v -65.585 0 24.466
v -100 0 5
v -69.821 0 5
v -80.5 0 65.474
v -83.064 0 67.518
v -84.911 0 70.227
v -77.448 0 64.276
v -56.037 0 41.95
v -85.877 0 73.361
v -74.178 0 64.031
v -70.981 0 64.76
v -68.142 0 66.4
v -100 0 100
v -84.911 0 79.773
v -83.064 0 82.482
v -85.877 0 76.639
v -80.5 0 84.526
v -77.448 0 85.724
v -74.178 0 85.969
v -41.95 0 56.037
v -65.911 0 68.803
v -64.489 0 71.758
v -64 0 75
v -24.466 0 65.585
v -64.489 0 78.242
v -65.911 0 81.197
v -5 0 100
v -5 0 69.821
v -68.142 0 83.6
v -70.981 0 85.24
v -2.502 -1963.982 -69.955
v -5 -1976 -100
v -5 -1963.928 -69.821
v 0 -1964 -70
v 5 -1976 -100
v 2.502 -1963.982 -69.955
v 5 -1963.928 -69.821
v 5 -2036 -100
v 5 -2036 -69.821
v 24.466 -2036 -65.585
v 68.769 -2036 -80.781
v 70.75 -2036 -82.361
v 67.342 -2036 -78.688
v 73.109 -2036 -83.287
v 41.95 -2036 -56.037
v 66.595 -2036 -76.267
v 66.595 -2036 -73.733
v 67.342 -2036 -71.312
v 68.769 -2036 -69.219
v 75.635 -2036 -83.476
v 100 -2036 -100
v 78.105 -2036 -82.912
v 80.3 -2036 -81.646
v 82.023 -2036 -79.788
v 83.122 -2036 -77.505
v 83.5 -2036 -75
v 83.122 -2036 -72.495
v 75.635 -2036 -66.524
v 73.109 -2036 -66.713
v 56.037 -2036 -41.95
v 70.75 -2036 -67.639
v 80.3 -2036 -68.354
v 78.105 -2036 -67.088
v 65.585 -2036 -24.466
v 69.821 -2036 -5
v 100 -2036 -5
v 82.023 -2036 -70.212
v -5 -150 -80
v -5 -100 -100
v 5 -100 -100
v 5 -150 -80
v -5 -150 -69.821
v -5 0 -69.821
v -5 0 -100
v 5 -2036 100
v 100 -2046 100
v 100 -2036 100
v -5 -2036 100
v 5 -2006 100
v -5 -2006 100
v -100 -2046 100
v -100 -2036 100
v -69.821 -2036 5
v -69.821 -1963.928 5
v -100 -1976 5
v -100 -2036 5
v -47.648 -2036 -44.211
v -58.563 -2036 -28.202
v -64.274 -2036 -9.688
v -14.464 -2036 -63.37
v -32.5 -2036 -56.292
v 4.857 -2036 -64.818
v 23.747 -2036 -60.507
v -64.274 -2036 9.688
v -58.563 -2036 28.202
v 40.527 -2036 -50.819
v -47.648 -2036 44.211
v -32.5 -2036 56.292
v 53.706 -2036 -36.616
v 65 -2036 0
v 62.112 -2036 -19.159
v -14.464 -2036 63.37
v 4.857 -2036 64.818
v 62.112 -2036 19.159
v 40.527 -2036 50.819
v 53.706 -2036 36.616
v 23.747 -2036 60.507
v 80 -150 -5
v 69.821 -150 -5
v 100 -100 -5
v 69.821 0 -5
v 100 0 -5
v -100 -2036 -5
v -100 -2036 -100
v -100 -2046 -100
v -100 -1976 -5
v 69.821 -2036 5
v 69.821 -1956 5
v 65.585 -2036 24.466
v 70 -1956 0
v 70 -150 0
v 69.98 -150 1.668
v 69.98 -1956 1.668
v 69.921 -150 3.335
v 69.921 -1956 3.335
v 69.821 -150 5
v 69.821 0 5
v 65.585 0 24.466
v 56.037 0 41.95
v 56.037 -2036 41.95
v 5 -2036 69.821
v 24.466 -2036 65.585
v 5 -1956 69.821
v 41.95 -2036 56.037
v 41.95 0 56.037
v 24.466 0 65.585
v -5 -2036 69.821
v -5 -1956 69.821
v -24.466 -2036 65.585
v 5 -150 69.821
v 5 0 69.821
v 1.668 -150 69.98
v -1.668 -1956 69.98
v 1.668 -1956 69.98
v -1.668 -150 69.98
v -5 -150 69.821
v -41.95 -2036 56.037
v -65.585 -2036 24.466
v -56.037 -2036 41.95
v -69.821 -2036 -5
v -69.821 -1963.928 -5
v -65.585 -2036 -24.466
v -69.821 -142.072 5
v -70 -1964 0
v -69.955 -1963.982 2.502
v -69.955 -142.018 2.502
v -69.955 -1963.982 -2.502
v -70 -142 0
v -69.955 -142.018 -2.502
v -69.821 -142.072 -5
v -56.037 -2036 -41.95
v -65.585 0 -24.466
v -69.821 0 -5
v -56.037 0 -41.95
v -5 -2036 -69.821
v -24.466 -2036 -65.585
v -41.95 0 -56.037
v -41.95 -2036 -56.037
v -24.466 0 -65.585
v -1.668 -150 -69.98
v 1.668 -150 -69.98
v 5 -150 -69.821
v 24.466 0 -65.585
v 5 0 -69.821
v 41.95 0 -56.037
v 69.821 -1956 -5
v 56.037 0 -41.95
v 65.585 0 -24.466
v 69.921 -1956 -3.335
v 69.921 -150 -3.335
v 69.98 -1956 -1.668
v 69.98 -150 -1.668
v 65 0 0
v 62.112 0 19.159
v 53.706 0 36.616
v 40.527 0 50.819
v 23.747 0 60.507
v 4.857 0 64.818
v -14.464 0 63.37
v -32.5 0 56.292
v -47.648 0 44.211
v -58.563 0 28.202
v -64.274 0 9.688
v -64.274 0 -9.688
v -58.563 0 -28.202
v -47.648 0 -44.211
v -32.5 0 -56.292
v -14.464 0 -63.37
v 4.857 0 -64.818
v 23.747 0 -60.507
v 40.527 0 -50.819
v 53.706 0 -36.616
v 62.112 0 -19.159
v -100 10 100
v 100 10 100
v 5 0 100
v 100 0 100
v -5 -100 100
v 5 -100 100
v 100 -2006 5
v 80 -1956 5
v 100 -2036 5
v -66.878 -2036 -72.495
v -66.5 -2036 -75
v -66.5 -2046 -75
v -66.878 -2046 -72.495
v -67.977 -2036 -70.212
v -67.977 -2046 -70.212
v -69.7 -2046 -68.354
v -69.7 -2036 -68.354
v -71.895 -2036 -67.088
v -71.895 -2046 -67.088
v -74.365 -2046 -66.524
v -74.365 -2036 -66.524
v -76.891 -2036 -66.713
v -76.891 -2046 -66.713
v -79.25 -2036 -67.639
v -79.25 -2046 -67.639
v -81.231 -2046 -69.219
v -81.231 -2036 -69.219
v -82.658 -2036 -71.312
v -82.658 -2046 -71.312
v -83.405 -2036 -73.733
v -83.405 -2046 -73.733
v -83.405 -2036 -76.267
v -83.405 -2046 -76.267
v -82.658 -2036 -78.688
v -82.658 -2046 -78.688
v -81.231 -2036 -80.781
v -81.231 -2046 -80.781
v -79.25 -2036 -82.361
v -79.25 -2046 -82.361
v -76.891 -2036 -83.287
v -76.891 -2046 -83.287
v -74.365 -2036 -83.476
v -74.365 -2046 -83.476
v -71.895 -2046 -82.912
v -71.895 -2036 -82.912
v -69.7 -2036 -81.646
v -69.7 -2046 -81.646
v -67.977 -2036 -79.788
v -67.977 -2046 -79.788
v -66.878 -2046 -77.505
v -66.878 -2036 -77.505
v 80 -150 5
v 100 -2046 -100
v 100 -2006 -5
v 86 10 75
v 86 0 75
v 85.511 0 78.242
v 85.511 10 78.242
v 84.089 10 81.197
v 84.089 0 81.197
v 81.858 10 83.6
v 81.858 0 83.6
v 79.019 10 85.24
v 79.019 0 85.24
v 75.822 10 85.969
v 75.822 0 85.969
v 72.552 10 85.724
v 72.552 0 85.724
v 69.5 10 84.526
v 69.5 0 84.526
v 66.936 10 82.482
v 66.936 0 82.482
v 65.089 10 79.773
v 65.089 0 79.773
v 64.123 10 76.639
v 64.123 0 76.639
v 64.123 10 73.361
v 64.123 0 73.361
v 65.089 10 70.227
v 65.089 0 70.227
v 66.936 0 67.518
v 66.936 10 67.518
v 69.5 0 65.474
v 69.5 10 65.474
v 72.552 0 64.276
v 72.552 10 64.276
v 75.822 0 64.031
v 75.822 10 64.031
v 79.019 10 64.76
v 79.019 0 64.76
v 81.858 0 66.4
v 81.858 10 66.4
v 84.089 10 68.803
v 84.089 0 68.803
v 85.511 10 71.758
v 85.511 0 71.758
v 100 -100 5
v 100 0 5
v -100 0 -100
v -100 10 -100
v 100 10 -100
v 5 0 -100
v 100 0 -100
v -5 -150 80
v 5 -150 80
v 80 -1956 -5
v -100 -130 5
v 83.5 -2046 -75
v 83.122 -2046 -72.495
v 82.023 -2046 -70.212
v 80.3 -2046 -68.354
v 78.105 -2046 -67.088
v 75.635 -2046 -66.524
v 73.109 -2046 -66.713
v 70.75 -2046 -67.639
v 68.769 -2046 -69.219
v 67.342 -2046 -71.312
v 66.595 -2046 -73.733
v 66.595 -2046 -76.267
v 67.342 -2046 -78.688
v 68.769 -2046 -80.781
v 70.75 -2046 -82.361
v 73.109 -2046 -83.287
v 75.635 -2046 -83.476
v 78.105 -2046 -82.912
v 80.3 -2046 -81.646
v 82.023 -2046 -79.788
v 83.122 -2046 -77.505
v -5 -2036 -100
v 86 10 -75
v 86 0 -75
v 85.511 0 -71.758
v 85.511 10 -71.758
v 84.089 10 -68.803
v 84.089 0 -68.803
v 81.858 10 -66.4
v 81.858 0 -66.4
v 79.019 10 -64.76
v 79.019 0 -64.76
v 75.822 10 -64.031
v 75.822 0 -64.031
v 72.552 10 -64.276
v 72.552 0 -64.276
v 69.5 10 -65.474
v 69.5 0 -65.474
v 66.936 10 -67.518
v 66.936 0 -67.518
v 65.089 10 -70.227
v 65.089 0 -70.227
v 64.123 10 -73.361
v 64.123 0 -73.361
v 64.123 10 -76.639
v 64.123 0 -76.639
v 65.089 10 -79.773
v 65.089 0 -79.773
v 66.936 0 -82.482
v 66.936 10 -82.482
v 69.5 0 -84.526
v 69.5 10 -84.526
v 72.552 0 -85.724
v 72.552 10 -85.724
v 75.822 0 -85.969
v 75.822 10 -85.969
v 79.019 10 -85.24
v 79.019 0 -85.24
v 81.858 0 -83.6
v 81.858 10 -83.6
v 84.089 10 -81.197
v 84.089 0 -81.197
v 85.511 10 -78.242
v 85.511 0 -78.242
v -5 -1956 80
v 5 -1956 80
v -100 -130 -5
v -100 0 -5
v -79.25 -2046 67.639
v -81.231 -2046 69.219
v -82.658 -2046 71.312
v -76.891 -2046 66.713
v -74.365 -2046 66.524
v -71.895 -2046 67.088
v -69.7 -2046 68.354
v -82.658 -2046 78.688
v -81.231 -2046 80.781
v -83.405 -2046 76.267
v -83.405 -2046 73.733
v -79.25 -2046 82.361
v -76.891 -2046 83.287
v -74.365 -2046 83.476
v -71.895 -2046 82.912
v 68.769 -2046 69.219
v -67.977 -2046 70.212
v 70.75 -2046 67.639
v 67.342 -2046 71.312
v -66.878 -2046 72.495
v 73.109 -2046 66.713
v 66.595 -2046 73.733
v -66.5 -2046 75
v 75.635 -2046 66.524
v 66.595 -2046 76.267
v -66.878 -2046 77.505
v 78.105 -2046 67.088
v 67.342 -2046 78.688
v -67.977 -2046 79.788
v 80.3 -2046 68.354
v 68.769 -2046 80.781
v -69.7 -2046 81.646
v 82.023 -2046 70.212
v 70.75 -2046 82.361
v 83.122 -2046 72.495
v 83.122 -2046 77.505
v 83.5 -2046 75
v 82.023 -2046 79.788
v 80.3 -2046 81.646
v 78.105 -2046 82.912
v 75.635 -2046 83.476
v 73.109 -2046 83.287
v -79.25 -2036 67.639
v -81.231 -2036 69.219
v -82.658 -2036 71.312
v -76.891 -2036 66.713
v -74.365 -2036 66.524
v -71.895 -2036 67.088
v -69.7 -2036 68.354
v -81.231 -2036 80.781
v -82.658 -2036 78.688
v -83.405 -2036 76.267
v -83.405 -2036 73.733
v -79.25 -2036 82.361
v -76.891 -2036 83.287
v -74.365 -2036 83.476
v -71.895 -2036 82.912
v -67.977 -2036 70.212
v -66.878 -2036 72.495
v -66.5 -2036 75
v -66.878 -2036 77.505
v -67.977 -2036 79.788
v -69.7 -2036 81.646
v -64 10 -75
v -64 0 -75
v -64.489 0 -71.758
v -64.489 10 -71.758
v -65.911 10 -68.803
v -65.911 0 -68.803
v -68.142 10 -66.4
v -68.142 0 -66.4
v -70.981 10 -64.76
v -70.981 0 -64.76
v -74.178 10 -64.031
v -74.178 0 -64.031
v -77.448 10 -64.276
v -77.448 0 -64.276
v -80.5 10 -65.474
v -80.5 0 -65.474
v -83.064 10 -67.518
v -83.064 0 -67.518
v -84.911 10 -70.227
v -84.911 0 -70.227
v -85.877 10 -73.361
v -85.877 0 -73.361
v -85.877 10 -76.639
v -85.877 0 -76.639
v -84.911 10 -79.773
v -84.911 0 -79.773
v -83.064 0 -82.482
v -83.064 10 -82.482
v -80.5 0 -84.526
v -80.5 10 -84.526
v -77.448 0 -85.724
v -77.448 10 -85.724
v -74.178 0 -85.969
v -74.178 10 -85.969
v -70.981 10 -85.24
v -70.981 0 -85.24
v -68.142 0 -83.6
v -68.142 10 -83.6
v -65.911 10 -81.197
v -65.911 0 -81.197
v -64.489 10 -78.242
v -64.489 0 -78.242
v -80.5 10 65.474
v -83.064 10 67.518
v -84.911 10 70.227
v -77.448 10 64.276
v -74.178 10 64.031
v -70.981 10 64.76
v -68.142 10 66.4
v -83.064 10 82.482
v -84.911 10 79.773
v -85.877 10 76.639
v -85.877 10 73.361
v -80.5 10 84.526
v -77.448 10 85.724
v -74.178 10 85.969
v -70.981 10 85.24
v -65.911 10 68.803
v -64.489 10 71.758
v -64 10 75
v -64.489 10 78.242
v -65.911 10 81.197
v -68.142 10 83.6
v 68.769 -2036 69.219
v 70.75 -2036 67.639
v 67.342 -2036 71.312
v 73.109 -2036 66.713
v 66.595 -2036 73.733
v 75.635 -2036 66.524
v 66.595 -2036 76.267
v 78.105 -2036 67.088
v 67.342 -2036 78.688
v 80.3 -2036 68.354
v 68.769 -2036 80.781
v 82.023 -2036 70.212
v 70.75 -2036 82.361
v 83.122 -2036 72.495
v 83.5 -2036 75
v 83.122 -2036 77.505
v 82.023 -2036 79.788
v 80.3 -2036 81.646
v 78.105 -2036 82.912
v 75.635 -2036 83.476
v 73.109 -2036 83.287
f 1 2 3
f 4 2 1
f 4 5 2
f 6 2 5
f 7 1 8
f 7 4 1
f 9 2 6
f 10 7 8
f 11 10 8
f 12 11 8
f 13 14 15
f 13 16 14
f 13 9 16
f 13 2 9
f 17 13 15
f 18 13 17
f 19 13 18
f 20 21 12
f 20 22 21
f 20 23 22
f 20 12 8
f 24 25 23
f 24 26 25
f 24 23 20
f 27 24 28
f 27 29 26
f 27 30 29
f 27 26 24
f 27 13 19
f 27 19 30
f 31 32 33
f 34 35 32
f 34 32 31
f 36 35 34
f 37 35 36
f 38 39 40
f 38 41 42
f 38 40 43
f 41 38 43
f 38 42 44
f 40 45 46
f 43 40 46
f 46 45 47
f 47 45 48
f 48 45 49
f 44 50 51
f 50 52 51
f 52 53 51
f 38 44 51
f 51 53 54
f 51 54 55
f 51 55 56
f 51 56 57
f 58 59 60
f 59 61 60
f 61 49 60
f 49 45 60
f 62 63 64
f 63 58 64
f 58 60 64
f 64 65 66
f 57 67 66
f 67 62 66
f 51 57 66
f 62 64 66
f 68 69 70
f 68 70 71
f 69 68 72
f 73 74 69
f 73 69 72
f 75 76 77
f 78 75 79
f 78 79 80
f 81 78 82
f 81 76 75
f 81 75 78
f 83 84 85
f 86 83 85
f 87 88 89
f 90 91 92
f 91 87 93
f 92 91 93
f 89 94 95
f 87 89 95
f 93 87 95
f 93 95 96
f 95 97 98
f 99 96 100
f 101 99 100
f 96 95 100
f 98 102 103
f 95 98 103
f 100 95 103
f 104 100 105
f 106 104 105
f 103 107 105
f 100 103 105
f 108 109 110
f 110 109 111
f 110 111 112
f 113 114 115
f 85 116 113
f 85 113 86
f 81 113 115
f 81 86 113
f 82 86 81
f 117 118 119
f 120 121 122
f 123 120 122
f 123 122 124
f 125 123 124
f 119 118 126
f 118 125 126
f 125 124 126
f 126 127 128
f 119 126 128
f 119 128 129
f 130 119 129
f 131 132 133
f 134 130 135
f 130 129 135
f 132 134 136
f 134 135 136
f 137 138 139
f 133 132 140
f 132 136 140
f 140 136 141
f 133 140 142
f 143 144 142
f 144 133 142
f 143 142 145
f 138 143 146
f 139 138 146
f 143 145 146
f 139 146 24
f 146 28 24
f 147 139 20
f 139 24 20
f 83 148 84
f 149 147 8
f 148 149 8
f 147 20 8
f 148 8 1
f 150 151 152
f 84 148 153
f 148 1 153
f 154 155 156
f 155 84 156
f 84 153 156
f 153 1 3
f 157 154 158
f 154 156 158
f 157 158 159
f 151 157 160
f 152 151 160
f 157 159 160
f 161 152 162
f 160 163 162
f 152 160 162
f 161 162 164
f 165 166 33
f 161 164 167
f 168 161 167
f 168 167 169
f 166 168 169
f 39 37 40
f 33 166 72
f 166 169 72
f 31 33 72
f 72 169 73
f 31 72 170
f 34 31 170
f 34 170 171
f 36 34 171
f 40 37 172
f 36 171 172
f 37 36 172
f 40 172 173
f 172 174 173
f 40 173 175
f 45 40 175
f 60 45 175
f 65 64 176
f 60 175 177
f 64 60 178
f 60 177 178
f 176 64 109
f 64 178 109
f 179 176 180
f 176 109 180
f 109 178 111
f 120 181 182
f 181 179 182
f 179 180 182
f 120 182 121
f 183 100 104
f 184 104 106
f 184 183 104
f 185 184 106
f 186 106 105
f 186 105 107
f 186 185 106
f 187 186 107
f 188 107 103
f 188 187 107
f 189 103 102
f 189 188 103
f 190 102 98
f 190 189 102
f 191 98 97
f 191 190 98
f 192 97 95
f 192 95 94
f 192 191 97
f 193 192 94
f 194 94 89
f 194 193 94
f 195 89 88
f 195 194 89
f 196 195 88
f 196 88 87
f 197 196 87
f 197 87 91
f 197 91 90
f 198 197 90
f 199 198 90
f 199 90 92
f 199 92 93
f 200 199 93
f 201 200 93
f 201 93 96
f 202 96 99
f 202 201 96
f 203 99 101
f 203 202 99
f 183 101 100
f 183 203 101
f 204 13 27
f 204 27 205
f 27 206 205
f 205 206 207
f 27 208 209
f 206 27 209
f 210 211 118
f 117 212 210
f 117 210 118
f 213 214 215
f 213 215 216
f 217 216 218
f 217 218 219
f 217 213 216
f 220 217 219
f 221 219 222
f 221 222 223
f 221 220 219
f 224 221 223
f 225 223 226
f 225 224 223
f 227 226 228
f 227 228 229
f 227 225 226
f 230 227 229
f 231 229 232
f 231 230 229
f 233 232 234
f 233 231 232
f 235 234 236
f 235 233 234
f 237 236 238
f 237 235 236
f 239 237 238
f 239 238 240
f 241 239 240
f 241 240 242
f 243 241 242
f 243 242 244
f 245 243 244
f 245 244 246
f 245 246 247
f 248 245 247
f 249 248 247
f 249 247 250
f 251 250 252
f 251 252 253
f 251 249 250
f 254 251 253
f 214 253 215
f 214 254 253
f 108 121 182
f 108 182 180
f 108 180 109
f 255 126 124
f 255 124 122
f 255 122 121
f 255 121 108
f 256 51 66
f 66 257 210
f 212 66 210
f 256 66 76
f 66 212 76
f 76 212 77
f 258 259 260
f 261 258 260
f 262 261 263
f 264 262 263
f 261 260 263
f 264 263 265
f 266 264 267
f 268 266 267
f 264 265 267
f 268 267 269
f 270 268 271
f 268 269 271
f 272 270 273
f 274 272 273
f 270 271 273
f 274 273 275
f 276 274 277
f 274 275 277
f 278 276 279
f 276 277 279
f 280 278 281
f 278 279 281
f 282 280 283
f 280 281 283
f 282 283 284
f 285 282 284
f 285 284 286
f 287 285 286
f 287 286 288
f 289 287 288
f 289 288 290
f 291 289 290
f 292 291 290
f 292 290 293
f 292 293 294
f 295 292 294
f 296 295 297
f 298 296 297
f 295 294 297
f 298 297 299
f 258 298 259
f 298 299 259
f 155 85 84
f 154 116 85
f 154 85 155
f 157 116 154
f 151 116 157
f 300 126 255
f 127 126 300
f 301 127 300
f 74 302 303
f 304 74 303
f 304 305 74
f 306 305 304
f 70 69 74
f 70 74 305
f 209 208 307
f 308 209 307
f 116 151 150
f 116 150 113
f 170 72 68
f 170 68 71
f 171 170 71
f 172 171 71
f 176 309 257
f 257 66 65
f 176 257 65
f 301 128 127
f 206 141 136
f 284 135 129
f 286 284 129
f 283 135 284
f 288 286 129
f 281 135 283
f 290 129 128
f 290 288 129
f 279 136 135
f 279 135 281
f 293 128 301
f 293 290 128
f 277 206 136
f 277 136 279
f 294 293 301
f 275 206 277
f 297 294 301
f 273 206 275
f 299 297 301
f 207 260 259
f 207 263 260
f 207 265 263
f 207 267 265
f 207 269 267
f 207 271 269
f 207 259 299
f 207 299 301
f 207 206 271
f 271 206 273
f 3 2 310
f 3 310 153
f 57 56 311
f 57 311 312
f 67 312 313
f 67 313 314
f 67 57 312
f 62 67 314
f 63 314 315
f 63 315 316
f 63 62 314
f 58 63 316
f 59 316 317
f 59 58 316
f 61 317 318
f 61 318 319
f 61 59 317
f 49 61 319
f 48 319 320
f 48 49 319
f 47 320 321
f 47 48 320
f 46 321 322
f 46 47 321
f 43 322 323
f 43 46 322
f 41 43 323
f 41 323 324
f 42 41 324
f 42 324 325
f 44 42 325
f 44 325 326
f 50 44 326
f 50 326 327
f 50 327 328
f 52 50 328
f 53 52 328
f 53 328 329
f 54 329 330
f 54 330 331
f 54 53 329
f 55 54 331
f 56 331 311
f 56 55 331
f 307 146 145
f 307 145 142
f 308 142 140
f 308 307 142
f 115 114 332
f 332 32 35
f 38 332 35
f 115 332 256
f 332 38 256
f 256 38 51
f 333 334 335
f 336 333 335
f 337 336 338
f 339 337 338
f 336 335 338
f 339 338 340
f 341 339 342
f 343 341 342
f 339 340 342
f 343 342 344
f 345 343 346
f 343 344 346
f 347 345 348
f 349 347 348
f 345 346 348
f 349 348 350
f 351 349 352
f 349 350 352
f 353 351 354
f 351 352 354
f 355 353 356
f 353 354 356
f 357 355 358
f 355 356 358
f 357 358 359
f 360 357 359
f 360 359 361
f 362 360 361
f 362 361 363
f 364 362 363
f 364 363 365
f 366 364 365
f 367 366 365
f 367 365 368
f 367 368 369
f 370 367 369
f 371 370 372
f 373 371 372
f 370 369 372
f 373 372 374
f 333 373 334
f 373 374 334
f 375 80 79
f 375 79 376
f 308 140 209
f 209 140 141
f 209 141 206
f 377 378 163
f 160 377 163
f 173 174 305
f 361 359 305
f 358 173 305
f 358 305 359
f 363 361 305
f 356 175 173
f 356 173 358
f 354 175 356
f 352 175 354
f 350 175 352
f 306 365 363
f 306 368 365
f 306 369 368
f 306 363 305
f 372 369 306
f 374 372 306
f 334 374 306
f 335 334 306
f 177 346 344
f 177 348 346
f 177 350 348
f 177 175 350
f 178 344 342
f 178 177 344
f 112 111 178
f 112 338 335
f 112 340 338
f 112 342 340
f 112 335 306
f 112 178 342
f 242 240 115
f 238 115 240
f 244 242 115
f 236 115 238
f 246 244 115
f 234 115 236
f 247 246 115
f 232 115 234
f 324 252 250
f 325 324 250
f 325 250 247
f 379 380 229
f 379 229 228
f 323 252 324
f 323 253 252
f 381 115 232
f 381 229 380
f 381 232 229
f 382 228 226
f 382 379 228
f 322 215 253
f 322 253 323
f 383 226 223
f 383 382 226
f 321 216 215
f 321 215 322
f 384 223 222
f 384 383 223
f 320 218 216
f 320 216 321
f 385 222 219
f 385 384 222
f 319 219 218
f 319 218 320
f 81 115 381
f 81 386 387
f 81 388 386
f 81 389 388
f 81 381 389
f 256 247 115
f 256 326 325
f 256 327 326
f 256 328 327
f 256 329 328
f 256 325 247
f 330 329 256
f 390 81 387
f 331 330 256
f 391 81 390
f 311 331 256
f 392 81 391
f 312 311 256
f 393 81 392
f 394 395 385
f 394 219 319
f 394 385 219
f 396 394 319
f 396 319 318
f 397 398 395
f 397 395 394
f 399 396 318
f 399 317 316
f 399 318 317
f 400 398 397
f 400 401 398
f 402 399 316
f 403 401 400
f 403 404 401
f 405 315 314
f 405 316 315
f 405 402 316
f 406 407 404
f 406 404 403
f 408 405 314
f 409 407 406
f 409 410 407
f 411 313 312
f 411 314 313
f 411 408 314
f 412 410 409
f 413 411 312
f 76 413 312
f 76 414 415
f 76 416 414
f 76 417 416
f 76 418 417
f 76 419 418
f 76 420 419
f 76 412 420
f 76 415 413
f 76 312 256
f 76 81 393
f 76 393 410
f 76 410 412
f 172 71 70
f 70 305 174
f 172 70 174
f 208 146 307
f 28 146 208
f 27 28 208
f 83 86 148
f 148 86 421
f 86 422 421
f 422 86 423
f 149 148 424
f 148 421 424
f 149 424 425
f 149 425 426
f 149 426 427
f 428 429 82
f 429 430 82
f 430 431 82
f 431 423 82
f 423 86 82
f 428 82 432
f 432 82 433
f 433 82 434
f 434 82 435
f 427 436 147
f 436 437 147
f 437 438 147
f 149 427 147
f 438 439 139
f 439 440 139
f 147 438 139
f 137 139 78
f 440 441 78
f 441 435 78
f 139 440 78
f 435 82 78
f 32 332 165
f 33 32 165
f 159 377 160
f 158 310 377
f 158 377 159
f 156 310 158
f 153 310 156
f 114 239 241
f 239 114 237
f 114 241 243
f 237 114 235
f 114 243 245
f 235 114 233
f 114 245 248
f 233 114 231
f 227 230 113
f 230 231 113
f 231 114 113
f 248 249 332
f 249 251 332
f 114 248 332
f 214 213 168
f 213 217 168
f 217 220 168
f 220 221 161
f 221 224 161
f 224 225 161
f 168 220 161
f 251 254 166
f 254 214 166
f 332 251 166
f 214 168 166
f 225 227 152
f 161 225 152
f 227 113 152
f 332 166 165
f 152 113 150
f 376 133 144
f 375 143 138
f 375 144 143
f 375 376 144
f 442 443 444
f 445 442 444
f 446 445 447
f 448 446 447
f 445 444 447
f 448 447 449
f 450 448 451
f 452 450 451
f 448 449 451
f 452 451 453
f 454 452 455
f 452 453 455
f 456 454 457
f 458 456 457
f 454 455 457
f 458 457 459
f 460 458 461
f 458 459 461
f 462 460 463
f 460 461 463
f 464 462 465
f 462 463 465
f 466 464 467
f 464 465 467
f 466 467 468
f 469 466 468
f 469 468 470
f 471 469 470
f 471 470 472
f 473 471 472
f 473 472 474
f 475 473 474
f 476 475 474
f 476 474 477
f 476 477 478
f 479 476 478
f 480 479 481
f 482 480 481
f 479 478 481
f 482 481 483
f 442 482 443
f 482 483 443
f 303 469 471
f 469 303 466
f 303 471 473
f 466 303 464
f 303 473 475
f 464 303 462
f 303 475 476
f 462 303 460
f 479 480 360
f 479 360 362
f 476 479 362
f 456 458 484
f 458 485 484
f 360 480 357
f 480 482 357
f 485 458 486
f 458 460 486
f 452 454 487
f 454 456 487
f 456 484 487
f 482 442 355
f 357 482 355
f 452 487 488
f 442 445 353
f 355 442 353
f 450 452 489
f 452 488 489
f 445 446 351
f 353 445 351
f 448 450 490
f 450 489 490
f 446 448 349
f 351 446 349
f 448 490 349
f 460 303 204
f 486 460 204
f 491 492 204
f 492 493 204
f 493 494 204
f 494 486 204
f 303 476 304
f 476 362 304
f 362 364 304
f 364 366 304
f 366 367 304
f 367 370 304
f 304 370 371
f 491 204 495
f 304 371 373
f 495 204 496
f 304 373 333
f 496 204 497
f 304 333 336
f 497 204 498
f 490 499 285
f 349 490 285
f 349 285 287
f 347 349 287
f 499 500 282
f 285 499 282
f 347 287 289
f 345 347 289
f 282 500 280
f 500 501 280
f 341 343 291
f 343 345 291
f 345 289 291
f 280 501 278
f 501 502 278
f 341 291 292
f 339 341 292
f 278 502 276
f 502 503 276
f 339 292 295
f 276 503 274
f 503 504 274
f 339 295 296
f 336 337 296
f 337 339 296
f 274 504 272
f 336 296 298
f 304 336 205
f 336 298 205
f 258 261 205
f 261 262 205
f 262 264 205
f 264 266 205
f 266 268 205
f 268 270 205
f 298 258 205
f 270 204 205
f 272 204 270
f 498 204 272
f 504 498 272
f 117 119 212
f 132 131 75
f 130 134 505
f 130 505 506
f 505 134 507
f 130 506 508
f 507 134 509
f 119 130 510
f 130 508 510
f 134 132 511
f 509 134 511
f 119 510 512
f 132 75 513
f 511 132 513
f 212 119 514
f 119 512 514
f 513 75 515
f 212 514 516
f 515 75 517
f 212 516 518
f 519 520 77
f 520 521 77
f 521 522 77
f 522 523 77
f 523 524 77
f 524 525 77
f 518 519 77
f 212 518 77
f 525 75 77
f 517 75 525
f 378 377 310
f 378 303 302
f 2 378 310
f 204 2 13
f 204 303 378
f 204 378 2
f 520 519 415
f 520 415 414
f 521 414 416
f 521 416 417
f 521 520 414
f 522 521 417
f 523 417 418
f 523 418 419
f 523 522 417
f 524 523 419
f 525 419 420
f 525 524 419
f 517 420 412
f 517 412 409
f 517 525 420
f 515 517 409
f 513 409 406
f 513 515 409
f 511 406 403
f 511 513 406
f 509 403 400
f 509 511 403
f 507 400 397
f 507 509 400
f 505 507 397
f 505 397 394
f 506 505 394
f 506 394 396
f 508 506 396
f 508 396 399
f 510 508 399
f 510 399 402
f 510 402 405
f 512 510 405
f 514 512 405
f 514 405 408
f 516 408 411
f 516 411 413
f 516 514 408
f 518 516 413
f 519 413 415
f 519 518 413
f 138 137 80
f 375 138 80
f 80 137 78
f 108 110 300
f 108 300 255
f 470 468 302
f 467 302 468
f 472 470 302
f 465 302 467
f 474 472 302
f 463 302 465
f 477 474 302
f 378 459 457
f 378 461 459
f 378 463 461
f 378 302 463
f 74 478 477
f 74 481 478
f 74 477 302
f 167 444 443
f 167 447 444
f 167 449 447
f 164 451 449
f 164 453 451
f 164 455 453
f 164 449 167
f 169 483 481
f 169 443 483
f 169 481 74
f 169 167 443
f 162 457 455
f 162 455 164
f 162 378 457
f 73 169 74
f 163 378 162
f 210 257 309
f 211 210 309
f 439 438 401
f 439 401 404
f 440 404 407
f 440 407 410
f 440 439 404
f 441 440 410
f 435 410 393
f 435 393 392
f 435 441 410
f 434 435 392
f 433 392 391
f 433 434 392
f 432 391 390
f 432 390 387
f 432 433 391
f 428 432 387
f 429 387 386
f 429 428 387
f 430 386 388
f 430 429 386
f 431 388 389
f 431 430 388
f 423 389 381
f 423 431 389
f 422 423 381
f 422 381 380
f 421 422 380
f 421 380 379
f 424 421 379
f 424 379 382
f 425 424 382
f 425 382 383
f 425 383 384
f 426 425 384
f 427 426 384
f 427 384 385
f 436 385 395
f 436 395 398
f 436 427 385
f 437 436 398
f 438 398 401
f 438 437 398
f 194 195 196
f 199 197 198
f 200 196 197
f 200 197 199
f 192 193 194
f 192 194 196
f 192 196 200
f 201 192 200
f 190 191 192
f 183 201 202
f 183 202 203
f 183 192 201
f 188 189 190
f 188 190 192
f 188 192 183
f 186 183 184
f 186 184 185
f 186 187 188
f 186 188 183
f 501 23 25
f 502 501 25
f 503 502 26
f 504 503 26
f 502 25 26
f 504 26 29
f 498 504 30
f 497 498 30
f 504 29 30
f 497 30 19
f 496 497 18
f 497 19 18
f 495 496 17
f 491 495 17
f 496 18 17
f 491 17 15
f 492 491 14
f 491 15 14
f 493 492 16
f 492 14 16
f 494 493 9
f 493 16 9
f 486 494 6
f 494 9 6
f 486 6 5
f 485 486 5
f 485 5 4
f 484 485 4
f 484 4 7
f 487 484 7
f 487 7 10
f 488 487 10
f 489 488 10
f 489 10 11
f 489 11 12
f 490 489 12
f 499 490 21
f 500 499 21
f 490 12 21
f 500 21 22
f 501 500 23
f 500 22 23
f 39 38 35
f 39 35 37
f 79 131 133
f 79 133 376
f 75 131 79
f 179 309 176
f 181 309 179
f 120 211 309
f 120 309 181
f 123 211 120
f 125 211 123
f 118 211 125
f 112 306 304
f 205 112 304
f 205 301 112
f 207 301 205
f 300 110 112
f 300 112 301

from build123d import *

# Parameters (mm, degrees)
F0_R          = 70
F0_R_2        = 65
F1_DEPTH      = 2036
F2_W          = 200
F2_H          = 200
F2_R          = 11
F3_DEPTH      = 10
F4_W          = 30.1787997812
F4_H          = 10
F4_W_2        = 10
F4_H_2        = 30.1787997812
F5_DEPTH      = 150
F6_T1_DEPTH   = 269.311363913
F6_T3_DEPTH   = 269.311363913
F6_T8_DEPTH   = 269.311363913
F6_S9_R       = 70
F6_T10_DEPTH  = 139
F8_W          = 200
F8_H          = 200
F8_R          = 8.5
F9_DEPTH      = 10
F10_W         = 10
F10_H         = 30.1787997812
F10_W_2       = 30.1787997812
F10_H_2       = 10
F11_DEPTH     = 80
F12_T1_DEPTH  = 269.311363913
F12_T3_DEPTH  = 269.311363913
F12_T8_DEPTH  = 269.311363913
F12_S9_R      = 70
F12_T10_DEPTH = 139
F12_T14_DEPTH = 269.311363913
F12_S15_R     = 70
F12_T16_DEPTH = 139


# Not quite as in the source:
# - a fillet or chamfer that OpenCascade refuses, or shapes differently, is made with other operations: its cross-section is extruded or revolved along the edge and cut away or added


with BuildPart() as f1:
    # F0 (on Front) → F1 (new body)
    with BuildSketch(Plane.XZ):
        Circle(F0_R)
        Circle(F0_R_2, mode=Mode.SUBTRACT)
    extrude(amount=F1_DEPTH)

    # F2 (on Front) → F3 (join)
    with BuildSketch(Plane.XZ):
        Rectangle(F2_W, F2_H)
        with Locations((-75, -75)):
            Circle(F2_R, mode=Mode.SUBTRACT)
        with Locations((75, -75)):
            Circle(F2_R, mode=Mode.SUBTRACT)
        with Locations((-75, 75)):
            Circle(F2_R, mode=Mode.SUBTRACT)
        with Locations((75, 75)):
            Circle(F2_R, mode=Mode.SUBTRACT)
    extrude(amount=-F3_DEPTH)

    # F4 (on Front) → F5 (join)
    with BuildSketch(Plane.XZ):
        with Locations((-84.9106001094, 0)):
            Rectangle(F4_W, F4_H)
        with Locations((0, 84.9106001094)):
            Rectangle(F4_W_2, F4_H_2)
        with Locations((84.9106001094, 0)):
            Rectangle(F4_W, F4_H)
        with Locations((0, -84.9106001094)):
            Rectangle(F4_W_2, F4_H_2)
    extrude(amount=F5_DEPTH)

    # F6: chamfer of 50 x 20 on 4 edges, made by hand

    # F6_s2 → F6_t1 (cut)
    with BuildSketch(Plane.YZ.offset(-134.6556819565)):
        Polygon((-100, 100), (-150, 80), (-150, 100), align=None)
        Polygon((-100, -100), (-150, -80), (-150, -100), align=None)
    extrude(amount=F6_T1_DEPTH, mode=Mode.SUBTRACT)

    # F6_s4 → F6_t3 (cut)
    with BuildSketch(Plane.XY.offset(-134.6556819565)):
        Polygon((100, -100), (80, -150), (100, -150), align=None)
    extrude(amount=F6_T3_DEPTH, mode=Mode.SUBTRACT)


with BuildPart() as f6_tool6:
    # F6_s7 → F6_t8 (new body)
    with BuildSketch(Plane.XY.offset(134.6556819565)):
        Polygon((-100, -130), (-50, -150), (-100, -150), align=None)
    extrude(amount=-F6_T8_DEPTH)

    # F6_s9 → F6_t10 (cut, symmetric)
    with BuildSketch(Plane.XZ.offset(140)):
        Circle(F6_S9_R)
    extrude(amount=F6_T10_DEPTH, both=True, mode=Mode.SUBTRACT)


with BuildPart() as f1_1:
    add(f1.part)

    # F6_t5: cut F6_tool6
    add(f6_tool6.part, mode=Mode.SUBTRACT)

    # F8 (on offset) → F9 (join)
    with BuildSketch(Plane.XZ.offset(2036)):
        Rectangle(F8_W, F8_H)
        with Locations((-75, -75)):
            Circle(F8_R, mode=Mode.SUBTRACT)
        with Locations((75, -75)):
            Circle(F8_R, mode=Mode.SUBTRACT)
        with Locations((-75, 75)):
            Circle(F8_R, mode=Mode.SUBTRACT)
        with Locations((75, 75)):
            Circle(F8_R, mode=Mode.SUBTRACT)
    extrude(amount=F9_DEPTH)

    # F10 (on face) → F11 (join)
    with BuildSketch(Plane(origin=(0, -2036, 0), x_dir=(-1, 0, 0), z_dir=(0, 1, 0))):
        with Locations((0, 84.9106001094)):
            Rectangle(F10_W, F10_H)
        with Locations((84.9106001094, 0)):
            Rectangle(F10_W_2, F10_H_2)
        with Locations((0, -84.9106001094)):
            Rectangle(F10_W, F10_H)
        with Locations((-84.9106001094, 0)):
            Rectangle(F10_W_2, F10_H_2)
    extrude(amount=F11_DEPTH)

    # F12: chamfer of 20 x 50 on 4 edges, made by hand

    # F12_s2 → F12_t1 (cut)
    with BuildSketch(Plane.YZ.offset(-134.6556819565)):
        Polygon((-2006, 100), (-1956, 80), (-1956, 100), align=None)
    extrude(amount=F12_T1_DEPTH, mode=Mode.SUBTRACT)

    # F12_s4 → F12_t3 (cut)
    with BuildSketch(Plane.XY.offset(-134.6556819565)):
        Polygon((100, -2006), (80, -1956), (100, -1956), align=None)
    extrude(amount=F12_T3_DEPTH, mode=Mode.SUBTRACT)


with BuildPart() as f12_tool6:
    # F12_s7 → F12_t8 (new body)
    with BuildSketch(Plane.XY.offset(-134.6556819565)):
        Polygon((-100, -1976), (-50, -1956), (-100, -1956), align=None)
    extrude(amount=F12_T8_DEPTH)

    # F12_s9 → F12_t10 (cut, symmetric)
    with BuildSketch(Plane.XZ.offset(1966)):
        Circle(F12_S9_R)
    extrude(amount=F12_T10_DEPTH, both=True, mode=Mode.SUBTRACT)


with BuildPart() as f1_2:
    add(f1_1.part)

    # F12_t5: cut F12_tool6
    add(f12_tool6.part, mode=Mode.SUBTRACT)


with BuildPart() as f12_tool12:
    # F12_s13 → F12_t14 (new body)
    with BuildSketch(Plane.YZ.offset(134.6556819565)):
        Polygon((-1976, -100), (-1956, -50), (-1956, -100), align=None)
    extrude(amount=-F12_T14_DEPTH)

    # F12_s15 → F12_t16 (cut, symmetric)
    with BuildSketch(Plane.XZ.offset(1966)):
        Circle(F12_S15_R)
    extrude(amount=F12_T16_DEPTH, both=True, mode=Mode.SUBTRACT)


with BuildPart() as f1_3:
    add(f1_2.part)

    # F12_t11: cut F12_tool12
    add(f12_tool12.part, mode=Mode.SUBTRACT)


solid = f1_3.part
